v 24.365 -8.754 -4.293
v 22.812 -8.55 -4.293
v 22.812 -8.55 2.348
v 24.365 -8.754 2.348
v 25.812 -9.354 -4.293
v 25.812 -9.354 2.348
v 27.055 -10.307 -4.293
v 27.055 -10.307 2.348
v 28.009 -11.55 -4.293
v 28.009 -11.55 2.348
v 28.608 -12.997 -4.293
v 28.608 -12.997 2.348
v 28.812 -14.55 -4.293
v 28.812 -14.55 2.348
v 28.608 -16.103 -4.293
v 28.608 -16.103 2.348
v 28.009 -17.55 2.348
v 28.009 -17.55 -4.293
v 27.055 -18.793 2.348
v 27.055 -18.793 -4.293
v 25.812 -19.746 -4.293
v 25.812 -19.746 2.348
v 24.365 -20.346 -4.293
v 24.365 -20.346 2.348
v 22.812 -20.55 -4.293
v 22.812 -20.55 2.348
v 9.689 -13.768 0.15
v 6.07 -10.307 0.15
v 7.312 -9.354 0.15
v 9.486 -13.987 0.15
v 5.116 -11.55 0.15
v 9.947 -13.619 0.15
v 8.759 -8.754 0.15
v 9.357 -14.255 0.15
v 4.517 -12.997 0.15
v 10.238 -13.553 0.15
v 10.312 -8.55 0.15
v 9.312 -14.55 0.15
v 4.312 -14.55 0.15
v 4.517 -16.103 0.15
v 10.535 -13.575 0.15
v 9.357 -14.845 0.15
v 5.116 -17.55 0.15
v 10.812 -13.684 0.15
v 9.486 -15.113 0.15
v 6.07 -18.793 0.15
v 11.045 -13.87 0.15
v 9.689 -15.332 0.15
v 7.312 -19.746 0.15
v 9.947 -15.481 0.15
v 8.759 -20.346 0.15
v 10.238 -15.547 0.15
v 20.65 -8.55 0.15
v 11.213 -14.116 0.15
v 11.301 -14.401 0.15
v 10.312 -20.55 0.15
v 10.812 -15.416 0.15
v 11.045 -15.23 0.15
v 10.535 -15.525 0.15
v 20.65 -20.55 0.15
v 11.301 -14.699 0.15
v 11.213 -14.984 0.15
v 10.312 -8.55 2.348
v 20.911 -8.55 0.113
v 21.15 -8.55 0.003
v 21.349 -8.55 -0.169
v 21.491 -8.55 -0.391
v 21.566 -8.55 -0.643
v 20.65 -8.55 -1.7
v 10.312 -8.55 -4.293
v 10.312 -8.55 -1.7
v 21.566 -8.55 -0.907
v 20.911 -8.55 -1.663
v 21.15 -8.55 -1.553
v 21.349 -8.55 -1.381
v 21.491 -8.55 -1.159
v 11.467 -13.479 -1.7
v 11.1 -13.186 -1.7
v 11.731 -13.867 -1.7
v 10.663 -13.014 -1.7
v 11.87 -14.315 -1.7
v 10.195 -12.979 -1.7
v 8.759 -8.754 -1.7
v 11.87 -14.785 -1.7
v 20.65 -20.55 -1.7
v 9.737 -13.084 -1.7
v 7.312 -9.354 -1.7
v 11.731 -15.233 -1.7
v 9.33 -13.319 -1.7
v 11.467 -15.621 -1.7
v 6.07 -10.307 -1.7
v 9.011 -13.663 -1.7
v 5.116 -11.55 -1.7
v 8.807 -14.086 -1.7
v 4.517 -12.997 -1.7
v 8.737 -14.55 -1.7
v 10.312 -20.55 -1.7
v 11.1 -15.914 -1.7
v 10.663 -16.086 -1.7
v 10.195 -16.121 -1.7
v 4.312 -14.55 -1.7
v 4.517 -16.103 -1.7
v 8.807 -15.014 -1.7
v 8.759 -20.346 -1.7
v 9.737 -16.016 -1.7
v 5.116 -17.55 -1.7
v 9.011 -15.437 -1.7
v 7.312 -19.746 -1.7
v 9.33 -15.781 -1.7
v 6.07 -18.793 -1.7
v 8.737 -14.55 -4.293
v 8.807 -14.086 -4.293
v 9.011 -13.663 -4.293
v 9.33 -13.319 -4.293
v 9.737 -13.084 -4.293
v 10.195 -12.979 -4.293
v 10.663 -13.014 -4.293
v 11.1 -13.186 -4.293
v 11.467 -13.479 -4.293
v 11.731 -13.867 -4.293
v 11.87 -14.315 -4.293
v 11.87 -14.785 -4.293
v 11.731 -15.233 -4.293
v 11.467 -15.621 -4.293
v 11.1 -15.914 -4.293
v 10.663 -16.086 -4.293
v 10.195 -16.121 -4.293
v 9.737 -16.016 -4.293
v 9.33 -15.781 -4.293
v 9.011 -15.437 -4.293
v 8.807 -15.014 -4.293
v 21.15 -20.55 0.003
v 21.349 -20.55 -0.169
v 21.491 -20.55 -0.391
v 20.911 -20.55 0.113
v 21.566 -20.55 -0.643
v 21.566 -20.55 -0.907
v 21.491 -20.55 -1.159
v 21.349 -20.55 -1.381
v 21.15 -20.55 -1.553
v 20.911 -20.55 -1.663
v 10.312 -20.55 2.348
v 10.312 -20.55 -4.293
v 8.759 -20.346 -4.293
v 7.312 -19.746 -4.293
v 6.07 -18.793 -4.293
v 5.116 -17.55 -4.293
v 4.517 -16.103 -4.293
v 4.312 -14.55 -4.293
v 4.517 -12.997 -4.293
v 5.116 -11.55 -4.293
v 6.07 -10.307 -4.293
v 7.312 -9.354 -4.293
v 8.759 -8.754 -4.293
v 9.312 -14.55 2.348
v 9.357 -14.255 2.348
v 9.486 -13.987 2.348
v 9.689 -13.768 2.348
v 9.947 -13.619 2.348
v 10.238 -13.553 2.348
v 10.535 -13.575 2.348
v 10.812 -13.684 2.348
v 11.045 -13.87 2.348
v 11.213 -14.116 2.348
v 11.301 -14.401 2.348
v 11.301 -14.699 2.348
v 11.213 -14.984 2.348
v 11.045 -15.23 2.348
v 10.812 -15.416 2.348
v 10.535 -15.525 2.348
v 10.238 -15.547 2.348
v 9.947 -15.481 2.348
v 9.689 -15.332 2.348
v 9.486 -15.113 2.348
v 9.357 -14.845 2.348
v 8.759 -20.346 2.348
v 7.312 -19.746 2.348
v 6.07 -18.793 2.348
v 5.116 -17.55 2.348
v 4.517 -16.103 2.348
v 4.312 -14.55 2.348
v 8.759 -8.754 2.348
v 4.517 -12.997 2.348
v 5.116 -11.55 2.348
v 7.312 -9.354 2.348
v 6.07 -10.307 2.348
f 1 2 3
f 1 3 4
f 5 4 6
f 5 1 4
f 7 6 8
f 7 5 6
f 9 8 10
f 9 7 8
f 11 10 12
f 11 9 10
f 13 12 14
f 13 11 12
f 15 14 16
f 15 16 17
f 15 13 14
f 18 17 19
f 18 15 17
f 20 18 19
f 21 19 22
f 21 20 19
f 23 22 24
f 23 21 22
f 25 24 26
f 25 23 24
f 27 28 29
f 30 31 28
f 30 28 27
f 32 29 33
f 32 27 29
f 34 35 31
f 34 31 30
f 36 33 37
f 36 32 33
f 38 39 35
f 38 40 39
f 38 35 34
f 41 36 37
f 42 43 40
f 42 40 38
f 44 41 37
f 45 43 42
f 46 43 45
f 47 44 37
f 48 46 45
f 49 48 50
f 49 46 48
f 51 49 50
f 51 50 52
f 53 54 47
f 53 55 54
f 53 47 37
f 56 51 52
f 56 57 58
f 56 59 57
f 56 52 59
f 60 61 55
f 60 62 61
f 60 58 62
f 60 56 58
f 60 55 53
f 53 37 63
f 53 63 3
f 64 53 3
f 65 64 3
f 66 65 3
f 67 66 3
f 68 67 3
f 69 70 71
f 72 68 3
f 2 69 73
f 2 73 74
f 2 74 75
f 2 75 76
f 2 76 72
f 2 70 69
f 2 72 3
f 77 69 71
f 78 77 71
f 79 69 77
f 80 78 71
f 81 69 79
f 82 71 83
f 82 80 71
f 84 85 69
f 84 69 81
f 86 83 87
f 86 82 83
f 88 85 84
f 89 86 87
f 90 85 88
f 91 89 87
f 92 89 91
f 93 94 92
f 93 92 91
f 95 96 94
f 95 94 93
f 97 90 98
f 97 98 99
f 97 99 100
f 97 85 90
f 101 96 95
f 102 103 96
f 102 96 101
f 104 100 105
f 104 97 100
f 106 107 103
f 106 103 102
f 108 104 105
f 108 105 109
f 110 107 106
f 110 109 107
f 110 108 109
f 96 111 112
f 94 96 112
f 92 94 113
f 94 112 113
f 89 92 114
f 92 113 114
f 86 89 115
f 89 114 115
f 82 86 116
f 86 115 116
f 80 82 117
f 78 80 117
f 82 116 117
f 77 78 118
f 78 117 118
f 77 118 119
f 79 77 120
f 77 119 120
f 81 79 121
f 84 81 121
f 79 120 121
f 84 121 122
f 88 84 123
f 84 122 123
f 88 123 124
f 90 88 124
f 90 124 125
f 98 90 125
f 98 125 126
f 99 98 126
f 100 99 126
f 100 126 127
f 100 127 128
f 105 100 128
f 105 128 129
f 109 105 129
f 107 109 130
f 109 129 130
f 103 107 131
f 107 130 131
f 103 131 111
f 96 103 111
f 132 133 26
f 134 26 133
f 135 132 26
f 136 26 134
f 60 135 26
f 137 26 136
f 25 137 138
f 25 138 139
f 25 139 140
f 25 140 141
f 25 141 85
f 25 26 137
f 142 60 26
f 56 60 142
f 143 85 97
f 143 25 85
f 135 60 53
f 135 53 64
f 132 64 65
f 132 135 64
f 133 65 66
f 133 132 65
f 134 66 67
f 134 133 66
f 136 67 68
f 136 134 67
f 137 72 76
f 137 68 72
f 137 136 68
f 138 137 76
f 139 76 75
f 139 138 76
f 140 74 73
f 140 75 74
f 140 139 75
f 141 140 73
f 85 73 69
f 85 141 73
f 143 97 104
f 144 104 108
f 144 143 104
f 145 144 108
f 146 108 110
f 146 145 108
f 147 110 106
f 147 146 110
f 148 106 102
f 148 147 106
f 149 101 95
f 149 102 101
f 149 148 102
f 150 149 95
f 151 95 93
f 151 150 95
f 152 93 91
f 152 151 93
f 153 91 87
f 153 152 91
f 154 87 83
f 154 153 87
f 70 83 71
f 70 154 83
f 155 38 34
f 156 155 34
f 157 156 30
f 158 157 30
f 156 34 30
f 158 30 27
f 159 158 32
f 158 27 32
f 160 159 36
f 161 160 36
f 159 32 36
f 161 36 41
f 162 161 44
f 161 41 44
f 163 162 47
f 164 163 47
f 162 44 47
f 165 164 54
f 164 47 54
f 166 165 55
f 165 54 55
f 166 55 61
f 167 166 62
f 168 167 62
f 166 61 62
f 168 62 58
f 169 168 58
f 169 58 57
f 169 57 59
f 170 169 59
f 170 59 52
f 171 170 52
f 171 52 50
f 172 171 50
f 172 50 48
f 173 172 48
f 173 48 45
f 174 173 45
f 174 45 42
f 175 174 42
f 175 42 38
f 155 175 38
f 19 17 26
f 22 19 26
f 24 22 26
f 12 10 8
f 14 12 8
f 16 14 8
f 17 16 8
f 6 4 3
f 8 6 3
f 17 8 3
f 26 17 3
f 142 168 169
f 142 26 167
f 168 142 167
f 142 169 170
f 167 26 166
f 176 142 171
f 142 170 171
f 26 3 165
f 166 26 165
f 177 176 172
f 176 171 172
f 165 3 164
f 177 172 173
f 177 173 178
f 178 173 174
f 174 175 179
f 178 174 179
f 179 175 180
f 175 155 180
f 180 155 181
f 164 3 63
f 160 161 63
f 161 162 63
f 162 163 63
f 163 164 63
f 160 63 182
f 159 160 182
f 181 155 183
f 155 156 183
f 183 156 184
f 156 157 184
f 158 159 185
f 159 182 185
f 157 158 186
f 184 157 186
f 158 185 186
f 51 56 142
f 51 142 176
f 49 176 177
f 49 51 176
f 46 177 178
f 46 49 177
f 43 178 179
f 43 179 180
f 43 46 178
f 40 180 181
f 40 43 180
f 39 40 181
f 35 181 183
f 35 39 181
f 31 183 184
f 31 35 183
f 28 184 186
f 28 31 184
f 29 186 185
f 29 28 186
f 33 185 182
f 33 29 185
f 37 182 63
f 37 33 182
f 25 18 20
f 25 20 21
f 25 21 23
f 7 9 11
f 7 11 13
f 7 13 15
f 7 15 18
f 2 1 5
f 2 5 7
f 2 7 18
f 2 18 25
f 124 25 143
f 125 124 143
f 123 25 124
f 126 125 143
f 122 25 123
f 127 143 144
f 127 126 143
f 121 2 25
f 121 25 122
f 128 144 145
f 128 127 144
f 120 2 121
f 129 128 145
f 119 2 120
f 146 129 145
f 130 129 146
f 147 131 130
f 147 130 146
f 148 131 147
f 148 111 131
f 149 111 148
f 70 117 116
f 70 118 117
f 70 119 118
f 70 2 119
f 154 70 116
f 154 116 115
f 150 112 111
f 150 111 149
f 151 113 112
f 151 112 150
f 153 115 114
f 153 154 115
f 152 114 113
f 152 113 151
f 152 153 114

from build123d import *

# Parameters (mm, degrees)
BOSS_EXTRUDE1_DEPTH      = 2.3476
BOSS_EXTRUDE1_DEPTH_BACK = 4.293
CUT_EXTRUDE1_DEPTH       = 32.505304994
SKETCH3_R                = 1.575
CUT_EXTRUDE2_DEPTH       = 2.593
SKETCH4_R                = 1
CUT_EXTRUDE3_DEPTH       = 36.667872697


with BuildPart() as part:
    # Sketch1 → Boss-Extrude1 (new, two sides: drawn at the far end of the back side and taken through both)
    with BuildSketch(Plane.XY.offset(-BOSS_EXTRUDE1_DEPTH_BACK)):
        with BuildLine():
            Line((10.3124, -8.55), (22.8124, -8.55))
            ThreePointArc((22.8124, -8.55), (28.8124, -14.55), (22.8124, -20.55))
            Line((22.8124, -20.55), (10.3124, -20.55))
            ThreePointArc((10.3124, -20.55), (4.3124, -14.55), (10.3124, -8.55))
        make_face()
    extrude(amount=BOSS_EXTRUDE1_DEPTH + BOSS_EXTRUDE1_DEPTH_BACK)

    # Sketch2 → Cut-Extrude1 (cut, through all)
    with BuildSketch(Plane.XZ.offset(20.55)):
        with BuildLine():
            Line((4.3124, 0.15), (20.65, 0.15))
            ThreePointArc((20.65, 0.15), (21.575, -0.775), (20.65, -1.7))
            Line((20.65, -1.7), (4.3124, -1.7))
            ThreePointArc((4.3124, -1.7), (3.3874, -0.775), (4.3124, 0.15))
        make_face()
    extrude(amount=-CUT_EXTRUDE1_DEPTH, mode=Mode.SUBTRACT)

    # Sketch3 → Cut-Extrude2 (cut)
    with BuildSketch(Plane(origin=(0, 0, -4.293), x_dir=(-1, 0, 0), z_dir=(0, 0, -1))):
        with Locations((-10.3124, -14.55)):
            Circle(SKETCH3_R)
    extrude(amount=-CUT_EXTRUDE2_DEPTH, mode=Mode.SUBTRACT)

    # Sketch4 → Cut-Extrude3 (cut, through all)
    with BuildSketch(Plane(origin=(0, 0, 0.15), x_dir=(-1, 0, 0), z_dir=(0, 0, -1))):
        with Locations((-10.3124, -14.55)):
            Circle(SKETCH4_R)
    extrude(amount=-CUT_EXTRUDE3_DEPTH, mode=Mode.SUBTRACT)


solid = part.part
